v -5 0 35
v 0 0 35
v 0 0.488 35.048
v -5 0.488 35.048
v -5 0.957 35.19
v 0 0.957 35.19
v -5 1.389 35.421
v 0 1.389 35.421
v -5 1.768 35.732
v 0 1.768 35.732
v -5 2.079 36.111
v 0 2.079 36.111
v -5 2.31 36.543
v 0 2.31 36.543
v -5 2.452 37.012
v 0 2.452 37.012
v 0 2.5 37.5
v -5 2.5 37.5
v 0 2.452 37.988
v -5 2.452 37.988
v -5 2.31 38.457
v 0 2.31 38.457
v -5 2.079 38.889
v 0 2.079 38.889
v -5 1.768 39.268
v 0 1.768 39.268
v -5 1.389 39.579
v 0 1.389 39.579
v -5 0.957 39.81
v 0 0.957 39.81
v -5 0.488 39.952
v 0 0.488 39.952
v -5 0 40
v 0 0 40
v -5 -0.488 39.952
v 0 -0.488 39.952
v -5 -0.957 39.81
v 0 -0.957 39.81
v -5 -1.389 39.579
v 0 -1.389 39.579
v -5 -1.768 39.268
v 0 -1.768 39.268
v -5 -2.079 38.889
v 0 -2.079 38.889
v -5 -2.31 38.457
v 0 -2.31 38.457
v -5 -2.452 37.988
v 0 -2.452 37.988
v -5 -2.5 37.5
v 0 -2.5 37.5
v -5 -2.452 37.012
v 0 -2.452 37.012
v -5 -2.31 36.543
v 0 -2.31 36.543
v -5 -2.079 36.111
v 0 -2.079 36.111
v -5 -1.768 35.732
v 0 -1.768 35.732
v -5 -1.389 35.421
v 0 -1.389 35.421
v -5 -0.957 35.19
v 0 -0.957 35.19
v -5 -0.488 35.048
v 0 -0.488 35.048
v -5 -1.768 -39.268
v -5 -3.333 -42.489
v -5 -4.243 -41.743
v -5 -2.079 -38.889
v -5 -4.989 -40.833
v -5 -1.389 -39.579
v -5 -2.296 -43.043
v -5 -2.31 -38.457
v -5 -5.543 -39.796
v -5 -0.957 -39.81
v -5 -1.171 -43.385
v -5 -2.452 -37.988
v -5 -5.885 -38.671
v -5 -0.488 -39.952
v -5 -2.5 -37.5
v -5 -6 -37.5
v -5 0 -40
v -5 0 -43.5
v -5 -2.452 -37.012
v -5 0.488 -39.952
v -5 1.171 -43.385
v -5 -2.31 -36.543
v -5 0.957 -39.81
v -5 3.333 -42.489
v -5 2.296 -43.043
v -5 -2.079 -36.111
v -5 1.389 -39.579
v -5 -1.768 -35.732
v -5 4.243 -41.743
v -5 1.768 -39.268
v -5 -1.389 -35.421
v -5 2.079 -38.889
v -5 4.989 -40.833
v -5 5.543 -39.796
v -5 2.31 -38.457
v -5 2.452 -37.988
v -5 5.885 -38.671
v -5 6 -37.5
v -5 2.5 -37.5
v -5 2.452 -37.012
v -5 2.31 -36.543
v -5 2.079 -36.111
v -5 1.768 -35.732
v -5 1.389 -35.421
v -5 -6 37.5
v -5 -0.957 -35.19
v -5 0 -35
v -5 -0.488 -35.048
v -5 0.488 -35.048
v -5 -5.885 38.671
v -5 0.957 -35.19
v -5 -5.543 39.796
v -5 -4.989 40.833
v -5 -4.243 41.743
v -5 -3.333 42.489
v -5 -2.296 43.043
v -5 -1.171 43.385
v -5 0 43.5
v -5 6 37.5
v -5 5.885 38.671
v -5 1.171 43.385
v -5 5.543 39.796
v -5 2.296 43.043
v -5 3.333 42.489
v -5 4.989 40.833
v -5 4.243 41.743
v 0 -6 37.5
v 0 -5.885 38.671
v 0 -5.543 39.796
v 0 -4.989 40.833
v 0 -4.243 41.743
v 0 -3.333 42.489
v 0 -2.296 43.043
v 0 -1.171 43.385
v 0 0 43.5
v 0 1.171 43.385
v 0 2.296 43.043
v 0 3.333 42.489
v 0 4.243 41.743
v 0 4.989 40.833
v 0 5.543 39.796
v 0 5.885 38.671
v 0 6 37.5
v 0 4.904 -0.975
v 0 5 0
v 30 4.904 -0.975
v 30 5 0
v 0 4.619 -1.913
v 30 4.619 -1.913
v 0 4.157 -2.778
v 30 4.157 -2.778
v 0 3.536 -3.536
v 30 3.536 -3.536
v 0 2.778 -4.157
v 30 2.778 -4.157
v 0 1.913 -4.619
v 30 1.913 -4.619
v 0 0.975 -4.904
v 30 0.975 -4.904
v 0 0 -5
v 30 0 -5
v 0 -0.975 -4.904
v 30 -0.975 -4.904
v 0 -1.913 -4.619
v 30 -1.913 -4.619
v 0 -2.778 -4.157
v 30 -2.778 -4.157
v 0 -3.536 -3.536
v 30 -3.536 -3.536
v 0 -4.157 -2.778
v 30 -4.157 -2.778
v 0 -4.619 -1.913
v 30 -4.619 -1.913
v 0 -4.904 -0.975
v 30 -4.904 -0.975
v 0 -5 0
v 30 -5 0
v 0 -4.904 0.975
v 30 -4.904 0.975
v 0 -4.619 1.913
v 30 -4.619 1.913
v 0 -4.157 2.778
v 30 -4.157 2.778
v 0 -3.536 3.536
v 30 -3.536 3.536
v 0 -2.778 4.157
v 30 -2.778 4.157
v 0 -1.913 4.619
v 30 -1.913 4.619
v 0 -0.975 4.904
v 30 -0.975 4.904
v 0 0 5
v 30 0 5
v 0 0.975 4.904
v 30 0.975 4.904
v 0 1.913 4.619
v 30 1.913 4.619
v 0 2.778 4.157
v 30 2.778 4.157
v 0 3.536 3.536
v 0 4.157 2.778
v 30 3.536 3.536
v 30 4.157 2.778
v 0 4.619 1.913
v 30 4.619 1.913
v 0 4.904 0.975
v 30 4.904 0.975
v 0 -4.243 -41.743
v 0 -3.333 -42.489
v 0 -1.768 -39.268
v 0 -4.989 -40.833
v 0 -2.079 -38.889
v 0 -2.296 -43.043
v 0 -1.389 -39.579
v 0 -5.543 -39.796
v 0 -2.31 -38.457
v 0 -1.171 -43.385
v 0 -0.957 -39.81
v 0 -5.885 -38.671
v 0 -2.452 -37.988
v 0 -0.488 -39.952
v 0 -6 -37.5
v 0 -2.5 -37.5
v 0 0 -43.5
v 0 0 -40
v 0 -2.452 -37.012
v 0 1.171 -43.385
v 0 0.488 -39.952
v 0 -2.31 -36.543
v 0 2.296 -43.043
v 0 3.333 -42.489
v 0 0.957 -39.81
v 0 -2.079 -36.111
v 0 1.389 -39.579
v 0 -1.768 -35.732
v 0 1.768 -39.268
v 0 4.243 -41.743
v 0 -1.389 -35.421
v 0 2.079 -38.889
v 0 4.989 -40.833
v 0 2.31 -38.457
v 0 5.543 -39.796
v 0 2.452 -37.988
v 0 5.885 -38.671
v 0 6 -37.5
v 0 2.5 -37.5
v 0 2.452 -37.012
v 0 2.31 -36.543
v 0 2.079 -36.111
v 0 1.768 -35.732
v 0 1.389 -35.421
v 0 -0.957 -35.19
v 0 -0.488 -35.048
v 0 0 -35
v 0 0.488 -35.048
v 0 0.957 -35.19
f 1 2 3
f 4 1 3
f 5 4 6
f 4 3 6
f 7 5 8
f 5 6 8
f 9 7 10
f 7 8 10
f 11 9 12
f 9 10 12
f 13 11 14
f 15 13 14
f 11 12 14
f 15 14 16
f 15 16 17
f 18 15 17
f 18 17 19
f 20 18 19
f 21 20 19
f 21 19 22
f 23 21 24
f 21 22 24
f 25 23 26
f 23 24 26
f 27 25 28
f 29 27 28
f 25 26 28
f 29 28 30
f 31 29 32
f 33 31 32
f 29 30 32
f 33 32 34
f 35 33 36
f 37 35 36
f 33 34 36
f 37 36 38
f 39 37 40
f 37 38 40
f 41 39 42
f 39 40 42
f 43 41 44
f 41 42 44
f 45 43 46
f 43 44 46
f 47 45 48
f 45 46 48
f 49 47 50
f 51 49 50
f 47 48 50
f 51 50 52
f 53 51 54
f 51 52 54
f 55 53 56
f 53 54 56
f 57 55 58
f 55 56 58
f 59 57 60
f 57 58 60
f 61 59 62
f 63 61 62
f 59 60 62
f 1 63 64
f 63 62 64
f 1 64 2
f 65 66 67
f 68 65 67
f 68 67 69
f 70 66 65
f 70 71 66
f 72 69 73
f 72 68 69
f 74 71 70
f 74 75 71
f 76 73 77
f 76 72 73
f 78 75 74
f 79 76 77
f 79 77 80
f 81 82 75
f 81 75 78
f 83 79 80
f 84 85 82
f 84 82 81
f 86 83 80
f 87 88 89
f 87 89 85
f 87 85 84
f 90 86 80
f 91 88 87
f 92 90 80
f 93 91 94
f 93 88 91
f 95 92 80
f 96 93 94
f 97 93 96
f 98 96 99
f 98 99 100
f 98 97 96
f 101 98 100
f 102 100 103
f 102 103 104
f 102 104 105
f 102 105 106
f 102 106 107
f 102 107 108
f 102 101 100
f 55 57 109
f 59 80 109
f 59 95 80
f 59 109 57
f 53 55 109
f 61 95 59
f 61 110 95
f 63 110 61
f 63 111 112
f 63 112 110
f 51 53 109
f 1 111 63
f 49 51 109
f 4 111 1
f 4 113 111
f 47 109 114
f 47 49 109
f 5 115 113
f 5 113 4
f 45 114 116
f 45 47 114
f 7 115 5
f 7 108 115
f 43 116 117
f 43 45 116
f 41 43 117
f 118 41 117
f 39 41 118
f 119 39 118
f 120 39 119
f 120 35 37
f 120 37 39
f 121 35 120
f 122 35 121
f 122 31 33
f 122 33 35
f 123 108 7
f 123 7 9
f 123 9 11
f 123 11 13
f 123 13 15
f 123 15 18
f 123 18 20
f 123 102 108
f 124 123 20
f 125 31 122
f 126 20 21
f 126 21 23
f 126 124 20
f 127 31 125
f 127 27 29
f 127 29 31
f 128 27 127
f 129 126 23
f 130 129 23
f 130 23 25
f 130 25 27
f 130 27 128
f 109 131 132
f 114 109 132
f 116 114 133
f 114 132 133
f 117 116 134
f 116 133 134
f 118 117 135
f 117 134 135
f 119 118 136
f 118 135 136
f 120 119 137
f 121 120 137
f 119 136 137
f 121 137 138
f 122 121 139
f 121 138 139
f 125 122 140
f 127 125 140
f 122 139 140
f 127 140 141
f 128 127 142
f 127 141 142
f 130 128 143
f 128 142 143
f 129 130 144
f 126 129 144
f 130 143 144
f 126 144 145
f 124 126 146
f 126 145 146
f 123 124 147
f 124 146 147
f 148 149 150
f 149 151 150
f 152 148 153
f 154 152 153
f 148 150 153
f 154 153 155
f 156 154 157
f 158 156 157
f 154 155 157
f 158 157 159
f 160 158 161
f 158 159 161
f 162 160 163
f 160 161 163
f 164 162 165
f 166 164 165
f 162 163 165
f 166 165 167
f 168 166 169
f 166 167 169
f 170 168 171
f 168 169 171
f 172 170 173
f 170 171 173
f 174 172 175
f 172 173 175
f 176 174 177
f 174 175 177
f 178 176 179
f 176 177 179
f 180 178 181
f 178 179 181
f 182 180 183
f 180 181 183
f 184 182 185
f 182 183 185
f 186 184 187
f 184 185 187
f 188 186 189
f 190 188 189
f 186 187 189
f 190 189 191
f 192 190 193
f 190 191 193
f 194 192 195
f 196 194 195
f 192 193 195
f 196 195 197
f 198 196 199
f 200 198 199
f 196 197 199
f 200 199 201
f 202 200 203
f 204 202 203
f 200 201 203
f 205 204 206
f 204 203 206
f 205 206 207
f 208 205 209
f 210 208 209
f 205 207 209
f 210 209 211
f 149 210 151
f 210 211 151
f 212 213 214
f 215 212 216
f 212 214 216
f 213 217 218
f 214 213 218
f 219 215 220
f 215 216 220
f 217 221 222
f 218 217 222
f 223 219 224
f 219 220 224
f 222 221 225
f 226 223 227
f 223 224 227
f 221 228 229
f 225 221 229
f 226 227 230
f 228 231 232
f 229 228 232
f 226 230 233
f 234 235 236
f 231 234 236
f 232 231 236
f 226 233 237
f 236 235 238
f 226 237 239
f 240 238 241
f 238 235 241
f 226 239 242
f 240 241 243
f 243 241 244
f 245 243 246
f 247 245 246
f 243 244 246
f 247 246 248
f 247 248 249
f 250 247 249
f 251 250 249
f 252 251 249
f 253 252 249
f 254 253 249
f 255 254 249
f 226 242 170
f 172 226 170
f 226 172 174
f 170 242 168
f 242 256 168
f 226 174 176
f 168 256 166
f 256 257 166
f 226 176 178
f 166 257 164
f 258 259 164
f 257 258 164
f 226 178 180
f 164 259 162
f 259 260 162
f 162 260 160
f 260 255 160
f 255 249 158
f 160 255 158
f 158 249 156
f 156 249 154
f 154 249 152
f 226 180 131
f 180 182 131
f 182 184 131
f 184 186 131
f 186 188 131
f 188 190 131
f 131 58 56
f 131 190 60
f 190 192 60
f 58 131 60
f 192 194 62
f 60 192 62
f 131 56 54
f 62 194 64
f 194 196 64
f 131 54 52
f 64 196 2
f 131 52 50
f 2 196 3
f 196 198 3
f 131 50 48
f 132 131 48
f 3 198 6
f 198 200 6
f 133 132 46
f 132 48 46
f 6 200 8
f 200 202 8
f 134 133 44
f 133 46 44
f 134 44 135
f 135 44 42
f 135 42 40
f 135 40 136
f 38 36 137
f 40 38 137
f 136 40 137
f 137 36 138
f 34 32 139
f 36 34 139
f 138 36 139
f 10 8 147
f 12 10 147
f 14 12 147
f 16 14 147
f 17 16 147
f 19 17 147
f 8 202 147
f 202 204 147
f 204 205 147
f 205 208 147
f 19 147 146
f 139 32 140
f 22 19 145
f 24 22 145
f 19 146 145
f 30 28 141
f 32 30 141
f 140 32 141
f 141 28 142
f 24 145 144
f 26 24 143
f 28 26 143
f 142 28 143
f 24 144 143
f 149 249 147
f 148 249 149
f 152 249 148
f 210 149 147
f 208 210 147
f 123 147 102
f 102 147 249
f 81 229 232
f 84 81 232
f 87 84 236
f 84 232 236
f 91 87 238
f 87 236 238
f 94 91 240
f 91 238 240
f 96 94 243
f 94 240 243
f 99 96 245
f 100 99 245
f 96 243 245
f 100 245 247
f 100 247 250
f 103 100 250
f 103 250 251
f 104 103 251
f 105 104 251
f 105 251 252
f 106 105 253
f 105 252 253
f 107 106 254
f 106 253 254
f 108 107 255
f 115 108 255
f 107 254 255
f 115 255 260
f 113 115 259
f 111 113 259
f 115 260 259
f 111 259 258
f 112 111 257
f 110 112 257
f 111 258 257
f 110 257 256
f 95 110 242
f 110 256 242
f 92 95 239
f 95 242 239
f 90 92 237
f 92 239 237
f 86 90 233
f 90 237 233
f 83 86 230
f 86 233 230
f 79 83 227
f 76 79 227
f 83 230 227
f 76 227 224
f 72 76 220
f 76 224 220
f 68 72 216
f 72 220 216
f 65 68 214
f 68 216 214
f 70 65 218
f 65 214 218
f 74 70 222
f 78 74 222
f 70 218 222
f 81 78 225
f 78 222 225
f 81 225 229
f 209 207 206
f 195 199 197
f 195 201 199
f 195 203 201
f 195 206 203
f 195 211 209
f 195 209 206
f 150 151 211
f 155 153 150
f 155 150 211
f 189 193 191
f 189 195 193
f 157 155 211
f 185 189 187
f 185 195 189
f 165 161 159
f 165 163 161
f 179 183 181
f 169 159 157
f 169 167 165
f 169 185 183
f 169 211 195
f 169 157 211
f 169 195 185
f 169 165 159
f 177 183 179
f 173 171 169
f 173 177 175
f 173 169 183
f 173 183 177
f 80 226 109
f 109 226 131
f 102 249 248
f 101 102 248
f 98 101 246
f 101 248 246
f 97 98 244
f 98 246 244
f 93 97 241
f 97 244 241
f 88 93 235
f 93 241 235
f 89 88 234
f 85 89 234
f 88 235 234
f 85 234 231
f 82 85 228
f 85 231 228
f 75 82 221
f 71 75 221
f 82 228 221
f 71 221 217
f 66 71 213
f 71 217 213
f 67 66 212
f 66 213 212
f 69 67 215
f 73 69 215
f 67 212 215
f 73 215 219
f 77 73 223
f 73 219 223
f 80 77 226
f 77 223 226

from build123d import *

# Parameters (mm, degrees)
ESBO_O1_W                = 30
ESBO_O1_H                = 5
ESBO_O2_R                = 2.5
RESSALTO_EXTRUS_O1_DEPTH = 5


with BuildPart() as part:
    # Esboço1 → Revolução1 (revolve)
    with BuildSketch(Plane.XY):
        with Locations((15, 2.5)):
            Rectangle(ESBO_O1_W, ESBO_O1_H)
    revolve(axis=Axis((30, 0, 0), (-1, 0, 0)))

    # Esboço2 → Ressalto-extrusão1 (add)
    with BuildSketch(Plane(origin=(0, 0, 0), x_dir=(0, 0, -1), z_dir=(1, 0, 0))):
        with BuildLine():
            Line((-37.5, 6), (37.5, 6))
            ThreePointArc((37.5, 6), (43.5, 0), (37.5, -6))
            Line((37.5, -6), (-37.5, -6))
            ThreePointArc((-37.5, -6), (-43.5, 0), (-37.5, 6))
        make_face()
        with Locations((-37.5, 0)):
            Circle(ESBO_O2_R, mode=Mode.SUBTRACT)
        with Locations((37.5, 0)):
            Circle(ESBO_O2_R, mode=Mode.SUBTRACT)
    extrude(amount=-RESSALTO_EXTRUS_O1_DEPTH)


solid = part.part
